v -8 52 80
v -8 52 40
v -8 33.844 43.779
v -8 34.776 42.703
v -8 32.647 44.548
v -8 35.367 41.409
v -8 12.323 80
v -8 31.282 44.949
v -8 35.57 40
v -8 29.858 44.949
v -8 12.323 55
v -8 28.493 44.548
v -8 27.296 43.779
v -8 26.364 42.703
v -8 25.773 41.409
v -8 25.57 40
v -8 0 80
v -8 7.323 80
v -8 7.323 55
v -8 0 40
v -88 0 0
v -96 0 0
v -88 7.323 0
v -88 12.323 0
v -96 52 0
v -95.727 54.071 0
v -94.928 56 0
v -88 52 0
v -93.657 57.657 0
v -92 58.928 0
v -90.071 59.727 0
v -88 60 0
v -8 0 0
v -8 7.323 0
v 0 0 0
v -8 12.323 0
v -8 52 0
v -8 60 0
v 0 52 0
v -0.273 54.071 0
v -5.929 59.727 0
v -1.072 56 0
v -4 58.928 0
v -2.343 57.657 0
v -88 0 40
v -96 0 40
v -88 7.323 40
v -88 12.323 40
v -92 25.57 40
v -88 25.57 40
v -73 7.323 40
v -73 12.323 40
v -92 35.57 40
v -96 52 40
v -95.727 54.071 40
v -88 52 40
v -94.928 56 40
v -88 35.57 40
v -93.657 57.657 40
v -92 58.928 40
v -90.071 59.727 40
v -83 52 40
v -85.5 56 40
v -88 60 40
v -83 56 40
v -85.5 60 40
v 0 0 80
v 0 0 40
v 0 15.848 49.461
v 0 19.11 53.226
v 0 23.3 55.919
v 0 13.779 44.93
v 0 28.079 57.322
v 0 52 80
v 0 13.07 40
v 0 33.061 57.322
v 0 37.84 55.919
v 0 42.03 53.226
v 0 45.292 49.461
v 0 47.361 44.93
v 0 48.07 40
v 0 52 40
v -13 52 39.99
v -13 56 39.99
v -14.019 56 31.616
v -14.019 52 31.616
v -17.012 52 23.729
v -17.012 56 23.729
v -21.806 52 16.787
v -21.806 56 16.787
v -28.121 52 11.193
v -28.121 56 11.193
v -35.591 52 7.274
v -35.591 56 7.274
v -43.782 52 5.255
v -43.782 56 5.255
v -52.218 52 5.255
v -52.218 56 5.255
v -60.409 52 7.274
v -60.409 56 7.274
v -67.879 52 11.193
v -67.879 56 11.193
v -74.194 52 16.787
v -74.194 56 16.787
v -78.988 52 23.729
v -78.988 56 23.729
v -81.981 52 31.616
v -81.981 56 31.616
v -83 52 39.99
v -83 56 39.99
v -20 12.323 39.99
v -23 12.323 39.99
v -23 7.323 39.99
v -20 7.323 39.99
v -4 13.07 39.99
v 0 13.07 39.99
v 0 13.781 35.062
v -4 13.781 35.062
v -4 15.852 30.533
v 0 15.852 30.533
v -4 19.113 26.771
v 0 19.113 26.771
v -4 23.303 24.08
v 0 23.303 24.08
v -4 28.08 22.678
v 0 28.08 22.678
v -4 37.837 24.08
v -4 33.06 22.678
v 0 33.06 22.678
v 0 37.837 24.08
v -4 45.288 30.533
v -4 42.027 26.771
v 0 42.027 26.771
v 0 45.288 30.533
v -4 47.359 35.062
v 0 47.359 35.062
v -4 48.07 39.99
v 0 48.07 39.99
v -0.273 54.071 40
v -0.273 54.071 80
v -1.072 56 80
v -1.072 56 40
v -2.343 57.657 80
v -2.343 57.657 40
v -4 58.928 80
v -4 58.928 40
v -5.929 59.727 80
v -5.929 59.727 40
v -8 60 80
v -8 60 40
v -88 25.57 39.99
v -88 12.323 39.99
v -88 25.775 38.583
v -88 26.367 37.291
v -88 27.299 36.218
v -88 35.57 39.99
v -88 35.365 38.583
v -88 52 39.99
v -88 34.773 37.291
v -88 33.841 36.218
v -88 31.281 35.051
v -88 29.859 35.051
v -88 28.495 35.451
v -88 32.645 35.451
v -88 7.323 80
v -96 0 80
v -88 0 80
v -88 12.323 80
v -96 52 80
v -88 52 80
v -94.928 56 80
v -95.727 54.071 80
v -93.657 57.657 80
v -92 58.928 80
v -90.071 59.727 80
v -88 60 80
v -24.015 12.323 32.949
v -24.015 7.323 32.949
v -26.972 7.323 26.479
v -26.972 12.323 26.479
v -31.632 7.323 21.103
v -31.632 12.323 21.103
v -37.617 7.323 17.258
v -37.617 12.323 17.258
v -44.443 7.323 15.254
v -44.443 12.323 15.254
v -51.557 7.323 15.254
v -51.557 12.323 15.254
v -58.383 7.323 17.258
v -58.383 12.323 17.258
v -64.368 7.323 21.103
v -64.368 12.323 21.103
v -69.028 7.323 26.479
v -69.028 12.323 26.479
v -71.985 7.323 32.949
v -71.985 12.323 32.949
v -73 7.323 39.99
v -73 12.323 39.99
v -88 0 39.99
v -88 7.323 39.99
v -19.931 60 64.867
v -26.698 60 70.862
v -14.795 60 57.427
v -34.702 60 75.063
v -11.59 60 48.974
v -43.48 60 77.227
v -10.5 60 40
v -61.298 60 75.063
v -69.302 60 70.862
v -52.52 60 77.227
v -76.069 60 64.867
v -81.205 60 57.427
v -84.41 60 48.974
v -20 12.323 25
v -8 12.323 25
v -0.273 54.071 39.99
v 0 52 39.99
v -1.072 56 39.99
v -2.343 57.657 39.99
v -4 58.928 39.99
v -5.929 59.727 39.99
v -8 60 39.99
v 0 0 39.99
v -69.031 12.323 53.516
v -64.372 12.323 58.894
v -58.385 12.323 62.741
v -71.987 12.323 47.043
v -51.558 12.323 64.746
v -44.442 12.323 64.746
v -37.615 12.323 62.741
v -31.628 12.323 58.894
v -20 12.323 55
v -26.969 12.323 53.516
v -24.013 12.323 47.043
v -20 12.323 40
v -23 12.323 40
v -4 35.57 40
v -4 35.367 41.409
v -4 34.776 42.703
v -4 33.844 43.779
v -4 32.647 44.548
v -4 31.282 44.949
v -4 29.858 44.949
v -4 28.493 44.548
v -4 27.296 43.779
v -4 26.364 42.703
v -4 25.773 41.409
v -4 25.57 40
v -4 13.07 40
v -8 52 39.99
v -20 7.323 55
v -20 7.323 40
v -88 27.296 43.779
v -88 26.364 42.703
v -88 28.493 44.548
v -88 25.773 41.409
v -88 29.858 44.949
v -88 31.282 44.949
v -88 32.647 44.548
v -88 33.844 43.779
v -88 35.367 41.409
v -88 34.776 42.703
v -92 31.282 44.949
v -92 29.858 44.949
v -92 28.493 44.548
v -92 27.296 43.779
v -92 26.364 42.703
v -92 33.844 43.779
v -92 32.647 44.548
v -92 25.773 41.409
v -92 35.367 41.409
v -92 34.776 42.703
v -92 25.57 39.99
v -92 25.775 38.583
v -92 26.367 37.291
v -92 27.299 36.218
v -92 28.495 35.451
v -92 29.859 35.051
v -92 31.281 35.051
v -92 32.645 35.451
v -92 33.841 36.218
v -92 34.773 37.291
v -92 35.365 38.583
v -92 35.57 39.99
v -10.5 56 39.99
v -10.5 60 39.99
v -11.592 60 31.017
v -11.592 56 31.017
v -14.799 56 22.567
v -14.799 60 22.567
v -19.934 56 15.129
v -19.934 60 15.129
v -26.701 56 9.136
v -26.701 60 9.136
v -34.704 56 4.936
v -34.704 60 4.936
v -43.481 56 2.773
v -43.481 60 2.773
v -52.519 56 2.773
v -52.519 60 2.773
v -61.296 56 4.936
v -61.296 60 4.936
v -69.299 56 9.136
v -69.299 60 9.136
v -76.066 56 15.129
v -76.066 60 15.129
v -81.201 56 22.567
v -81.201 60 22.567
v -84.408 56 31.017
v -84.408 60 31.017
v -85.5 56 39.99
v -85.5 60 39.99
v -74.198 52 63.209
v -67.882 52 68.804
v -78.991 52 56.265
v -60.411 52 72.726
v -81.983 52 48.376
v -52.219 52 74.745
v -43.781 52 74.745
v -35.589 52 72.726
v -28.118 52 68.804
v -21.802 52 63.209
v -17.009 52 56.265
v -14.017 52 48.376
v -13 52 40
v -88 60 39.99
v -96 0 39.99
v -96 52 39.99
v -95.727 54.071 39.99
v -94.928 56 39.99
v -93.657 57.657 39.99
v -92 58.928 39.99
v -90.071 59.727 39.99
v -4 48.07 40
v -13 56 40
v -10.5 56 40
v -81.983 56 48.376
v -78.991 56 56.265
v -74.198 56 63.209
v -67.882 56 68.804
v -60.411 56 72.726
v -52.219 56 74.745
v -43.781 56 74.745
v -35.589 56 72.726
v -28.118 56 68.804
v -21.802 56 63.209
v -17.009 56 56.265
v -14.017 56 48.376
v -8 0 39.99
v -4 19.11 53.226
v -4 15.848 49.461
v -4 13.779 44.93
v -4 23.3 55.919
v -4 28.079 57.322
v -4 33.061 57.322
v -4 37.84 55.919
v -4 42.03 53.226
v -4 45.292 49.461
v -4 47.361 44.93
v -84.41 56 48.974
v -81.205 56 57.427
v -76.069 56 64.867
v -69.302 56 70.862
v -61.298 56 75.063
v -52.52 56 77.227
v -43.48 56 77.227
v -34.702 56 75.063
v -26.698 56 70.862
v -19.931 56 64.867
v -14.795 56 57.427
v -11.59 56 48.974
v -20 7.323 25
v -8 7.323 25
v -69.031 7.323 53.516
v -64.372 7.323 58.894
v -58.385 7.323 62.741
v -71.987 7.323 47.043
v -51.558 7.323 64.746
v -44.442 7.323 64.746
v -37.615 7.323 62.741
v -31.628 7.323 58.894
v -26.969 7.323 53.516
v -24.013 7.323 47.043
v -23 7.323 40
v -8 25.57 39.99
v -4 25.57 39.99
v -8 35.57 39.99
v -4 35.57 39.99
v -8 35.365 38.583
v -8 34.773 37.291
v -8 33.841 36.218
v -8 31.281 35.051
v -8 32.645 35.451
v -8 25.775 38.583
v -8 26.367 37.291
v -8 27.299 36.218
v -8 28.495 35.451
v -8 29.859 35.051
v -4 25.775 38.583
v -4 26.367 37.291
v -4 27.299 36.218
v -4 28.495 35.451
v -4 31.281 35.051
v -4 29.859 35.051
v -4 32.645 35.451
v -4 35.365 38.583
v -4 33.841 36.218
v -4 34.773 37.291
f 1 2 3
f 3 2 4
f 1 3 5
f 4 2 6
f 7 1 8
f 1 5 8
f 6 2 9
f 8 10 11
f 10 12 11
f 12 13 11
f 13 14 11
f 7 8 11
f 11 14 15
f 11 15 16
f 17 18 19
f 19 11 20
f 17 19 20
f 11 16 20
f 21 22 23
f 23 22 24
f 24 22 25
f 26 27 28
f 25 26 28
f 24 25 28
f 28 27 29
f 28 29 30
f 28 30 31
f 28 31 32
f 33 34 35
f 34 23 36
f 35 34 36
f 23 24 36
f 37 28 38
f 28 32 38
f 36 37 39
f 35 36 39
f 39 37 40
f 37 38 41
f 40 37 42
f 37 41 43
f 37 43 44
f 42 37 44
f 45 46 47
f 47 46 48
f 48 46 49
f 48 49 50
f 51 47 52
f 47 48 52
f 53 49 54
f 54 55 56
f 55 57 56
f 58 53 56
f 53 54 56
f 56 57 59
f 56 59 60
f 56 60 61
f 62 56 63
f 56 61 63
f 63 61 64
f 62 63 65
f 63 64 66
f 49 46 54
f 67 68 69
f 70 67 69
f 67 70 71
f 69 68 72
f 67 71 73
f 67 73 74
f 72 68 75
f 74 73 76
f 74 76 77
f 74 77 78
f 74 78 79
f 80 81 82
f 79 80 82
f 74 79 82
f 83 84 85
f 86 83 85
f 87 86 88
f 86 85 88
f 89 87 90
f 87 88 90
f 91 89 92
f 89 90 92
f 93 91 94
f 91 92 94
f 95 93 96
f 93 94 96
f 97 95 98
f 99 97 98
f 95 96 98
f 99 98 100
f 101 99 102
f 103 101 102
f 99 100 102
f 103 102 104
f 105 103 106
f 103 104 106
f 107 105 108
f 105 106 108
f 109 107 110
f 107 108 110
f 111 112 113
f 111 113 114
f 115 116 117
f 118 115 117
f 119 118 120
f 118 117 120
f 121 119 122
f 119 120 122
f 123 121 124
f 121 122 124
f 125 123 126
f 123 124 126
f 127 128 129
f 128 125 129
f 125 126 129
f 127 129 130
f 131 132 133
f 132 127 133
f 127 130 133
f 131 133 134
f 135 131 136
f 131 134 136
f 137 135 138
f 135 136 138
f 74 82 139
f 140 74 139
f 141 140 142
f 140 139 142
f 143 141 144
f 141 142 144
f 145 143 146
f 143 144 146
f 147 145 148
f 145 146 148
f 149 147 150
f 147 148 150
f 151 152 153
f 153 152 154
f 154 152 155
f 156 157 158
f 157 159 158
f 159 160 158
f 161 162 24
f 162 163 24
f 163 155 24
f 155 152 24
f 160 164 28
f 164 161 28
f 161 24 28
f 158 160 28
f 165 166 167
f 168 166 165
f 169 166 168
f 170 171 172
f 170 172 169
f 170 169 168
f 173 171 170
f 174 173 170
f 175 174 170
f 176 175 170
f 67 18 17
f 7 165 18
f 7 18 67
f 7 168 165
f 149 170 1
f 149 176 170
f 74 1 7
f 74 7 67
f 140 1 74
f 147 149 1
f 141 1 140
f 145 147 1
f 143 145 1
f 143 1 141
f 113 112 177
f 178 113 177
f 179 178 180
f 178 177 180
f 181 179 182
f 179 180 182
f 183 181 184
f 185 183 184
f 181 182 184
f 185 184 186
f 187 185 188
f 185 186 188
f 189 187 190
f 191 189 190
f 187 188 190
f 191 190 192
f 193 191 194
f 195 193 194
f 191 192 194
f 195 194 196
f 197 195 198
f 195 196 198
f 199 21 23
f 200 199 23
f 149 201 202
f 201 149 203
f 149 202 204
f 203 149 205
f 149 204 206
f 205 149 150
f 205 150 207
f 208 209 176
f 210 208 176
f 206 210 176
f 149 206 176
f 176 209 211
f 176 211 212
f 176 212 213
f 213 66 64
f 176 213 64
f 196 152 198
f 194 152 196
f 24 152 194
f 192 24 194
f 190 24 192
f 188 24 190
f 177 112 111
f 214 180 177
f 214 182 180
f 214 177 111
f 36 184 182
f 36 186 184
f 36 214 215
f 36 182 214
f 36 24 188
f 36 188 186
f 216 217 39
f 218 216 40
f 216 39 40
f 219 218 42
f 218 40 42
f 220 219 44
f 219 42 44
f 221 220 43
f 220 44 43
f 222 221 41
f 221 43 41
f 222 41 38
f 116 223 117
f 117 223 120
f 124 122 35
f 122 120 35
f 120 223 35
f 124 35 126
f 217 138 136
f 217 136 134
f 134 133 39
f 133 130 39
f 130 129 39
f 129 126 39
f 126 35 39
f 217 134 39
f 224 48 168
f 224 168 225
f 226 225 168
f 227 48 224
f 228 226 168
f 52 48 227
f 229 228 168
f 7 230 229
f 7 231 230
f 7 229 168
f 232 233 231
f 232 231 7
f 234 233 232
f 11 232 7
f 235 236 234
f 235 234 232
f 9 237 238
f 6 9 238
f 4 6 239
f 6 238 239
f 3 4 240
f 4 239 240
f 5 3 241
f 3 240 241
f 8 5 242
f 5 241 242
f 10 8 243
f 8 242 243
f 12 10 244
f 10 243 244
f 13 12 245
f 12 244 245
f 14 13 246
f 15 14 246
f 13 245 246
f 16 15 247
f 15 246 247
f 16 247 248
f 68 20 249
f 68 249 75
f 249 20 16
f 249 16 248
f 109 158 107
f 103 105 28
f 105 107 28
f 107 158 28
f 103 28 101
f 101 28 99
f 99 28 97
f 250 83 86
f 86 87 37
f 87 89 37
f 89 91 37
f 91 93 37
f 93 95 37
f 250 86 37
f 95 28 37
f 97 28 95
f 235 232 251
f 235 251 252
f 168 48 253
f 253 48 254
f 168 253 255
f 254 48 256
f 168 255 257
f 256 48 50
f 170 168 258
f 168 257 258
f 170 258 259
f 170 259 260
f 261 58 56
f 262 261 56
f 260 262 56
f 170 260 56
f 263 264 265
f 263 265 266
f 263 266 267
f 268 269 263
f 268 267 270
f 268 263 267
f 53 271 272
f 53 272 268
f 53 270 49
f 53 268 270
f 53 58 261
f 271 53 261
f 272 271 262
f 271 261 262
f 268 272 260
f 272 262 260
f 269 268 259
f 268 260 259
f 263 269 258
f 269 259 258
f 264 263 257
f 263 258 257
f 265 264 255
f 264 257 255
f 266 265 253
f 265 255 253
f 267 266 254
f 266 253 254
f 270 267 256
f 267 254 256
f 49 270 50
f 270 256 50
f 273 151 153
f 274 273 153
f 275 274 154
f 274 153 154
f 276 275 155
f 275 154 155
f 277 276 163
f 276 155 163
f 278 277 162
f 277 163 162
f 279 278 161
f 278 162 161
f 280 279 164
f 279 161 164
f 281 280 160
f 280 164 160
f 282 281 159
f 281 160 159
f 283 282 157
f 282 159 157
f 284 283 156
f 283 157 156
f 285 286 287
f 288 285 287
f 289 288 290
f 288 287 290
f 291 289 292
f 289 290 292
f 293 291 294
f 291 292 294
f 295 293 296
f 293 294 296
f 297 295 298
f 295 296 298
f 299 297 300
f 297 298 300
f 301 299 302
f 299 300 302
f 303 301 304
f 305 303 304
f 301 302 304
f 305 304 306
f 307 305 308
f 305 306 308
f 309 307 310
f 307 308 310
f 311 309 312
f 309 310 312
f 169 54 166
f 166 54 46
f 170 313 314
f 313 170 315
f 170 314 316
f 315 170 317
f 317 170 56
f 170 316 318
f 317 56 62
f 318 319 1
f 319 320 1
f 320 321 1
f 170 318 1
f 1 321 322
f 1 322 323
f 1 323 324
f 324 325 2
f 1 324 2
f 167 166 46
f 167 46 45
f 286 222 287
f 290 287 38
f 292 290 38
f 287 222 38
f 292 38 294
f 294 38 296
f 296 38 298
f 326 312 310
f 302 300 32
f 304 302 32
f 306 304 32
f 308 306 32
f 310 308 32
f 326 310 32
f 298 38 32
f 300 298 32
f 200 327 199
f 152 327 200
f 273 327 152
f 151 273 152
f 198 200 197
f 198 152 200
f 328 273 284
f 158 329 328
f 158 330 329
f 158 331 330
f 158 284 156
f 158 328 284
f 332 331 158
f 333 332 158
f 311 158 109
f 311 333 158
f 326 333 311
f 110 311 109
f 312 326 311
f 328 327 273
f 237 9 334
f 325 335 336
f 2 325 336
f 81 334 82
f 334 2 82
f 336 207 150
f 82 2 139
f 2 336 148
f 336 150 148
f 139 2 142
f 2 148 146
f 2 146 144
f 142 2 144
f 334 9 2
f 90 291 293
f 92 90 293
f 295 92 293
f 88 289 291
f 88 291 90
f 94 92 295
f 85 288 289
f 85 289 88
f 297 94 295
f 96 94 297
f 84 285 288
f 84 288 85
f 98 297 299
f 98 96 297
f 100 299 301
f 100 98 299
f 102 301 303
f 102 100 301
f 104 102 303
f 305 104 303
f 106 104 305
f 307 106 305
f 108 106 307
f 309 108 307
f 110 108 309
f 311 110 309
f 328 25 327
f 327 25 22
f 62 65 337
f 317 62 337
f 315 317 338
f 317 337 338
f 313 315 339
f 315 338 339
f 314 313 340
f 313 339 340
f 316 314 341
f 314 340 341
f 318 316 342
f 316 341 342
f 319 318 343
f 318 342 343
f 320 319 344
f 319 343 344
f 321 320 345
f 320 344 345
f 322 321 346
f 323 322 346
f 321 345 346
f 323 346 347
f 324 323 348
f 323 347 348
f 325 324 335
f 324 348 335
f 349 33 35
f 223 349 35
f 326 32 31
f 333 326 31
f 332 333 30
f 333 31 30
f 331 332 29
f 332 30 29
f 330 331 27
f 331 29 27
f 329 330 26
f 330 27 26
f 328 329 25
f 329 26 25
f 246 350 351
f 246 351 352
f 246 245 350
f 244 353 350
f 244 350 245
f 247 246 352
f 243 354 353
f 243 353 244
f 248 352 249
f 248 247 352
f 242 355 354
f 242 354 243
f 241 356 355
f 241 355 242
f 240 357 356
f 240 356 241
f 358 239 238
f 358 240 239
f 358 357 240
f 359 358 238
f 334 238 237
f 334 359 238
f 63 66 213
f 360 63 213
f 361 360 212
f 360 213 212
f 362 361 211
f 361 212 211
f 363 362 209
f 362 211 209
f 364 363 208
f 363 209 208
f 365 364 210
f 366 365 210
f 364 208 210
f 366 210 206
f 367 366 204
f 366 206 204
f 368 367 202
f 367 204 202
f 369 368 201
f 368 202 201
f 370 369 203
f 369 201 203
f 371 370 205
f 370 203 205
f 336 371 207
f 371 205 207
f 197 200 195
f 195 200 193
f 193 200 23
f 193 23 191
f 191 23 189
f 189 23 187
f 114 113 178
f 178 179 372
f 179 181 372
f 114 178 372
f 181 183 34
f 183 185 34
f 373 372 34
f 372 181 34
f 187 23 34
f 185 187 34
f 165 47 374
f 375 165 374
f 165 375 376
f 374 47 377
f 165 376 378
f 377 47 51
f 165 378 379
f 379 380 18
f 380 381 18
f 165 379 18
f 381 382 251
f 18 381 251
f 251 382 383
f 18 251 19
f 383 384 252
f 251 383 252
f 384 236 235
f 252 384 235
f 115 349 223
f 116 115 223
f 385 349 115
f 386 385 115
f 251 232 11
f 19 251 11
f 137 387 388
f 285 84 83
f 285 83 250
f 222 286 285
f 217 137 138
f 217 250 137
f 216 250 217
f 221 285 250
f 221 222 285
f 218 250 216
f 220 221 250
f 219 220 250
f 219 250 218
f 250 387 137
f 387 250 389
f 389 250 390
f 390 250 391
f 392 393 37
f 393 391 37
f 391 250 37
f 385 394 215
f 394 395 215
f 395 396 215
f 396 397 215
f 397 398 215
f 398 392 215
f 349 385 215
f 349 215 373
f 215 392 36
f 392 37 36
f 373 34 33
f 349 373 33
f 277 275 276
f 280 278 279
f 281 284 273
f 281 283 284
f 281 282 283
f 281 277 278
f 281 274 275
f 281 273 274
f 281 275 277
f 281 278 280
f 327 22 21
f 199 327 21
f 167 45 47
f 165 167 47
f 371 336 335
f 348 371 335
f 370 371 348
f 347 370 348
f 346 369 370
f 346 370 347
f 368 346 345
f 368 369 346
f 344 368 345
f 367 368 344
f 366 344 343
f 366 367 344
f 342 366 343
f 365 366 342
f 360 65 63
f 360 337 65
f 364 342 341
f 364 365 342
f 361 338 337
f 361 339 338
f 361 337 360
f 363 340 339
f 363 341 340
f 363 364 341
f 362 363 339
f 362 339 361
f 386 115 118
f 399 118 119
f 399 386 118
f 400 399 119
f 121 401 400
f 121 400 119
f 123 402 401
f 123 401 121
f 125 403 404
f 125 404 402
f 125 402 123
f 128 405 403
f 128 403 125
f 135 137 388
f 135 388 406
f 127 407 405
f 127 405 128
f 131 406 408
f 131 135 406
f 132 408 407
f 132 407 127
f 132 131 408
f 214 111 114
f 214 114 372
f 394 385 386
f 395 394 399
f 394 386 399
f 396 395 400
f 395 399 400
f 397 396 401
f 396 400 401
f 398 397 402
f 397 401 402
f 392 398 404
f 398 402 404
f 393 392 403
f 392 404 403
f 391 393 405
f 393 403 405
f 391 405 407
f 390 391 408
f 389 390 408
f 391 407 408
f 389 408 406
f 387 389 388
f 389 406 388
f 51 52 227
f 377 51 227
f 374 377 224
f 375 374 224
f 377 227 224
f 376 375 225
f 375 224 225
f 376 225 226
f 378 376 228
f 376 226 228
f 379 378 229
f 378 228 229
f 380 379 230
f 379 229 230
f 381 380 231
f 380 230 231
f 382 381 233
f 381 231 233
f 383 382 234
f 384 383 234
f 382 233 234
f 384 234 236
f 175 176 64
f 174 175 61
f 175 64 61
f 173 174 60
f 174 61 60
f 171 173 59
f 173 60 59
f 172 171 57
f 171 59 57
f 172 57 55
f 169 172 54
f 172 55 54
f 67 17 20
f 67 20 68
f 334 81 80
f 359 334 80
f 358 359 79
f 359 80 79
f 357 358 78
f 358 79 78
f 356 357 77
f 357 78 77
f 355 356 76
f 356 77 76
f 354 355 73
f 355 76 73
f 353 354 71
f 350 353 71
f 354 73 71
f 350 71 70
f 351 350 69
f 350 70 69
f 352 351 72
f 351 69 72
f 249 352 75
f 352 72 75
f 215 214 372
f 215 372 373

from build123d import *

# Parameters (mm, degrees)
SKETCH2_W           = 80
SKETCH2_H           = 39.677071002
BOSS_EXTRUDE1_DEPTH = 80
SKETCH3_R           = 37.5
CUT_EXTRUDE1_DEPTH  = 4
SKETCH4_R           = 35
CUT_EXTRUDE2_DEPTH  = 4
SKETCH5_R           = 25
CUT_EXTRUDE3_DEPTH  = 134.750151773
SKETCH6_W           = 12
SKETCH6_H           = 30
CUT_EXTRUDE4_DEPTH  = 134.750151773
SKETCH7_R           = 5
CUT_EXTRUDE5_DEPTH  = 92
SKETCH8_R           = 17.5
CUT_EXTRUDE6_DEPTH  = 4
SKETCH9_W           = 153.346772702
SKETCH9_H           = 84.356288718
CUT_EXTRUDE8_DEPTH  = 0.01


with BuildPart() as part:
    # Sketch2 → Boss-Extrude1 (new body)
    with BuildSketch(Plane.XY):
        with BuildLine():
            Line((0, 0), (0, 52))
            ThreePointArc((0, 52), (-2.343145751, 57.656854249), (-8, 60))
            Line((-8, 60), (-88, 60))
            ThreePointArc((-88, 60), (-93.656854249, 57.656854249), (-96, 52))
            Line((-96, 52), (-96, 0))
            Line((-96, 0), (-88, 0))
            Line((-88, 0), (-88, 7.322928998))
            Line((-88, 7.322928998), (-8, 7.322928998))
            Line((-8, 7.322928998), (-8, 0))
            Line((-8, 0), (0, 0))
        make_face()
        with Locations((-48, 32.161464499)):
            Rectangle(SKETCH2_W, SKETCH2_H, mode=Mode.SUBTRACT)
    extrude(amount=BOSS_EXTRUDE1_DEPTH)

    # Sketch3 → Cut-Extrude1 (cut)
    with BuildSketch(Plane(origin=(0, 60, 0), x_dir=(1, 0, 0), z_dir=(0, 1, 0))):
        with Locations(Location((-48, -40, 0), (0, 0, 180))):
            Circle(SKETCH3_R)
    extrude(amount=-CUT_EXTRUDE1_DEPTH, mode=Mode.SUBTRACT)

    # Sketch4 → Cut-Extrude2 (cut)
    with BuildSketch(Plane(origin=(0, 56, 0), x_dir=(1, 0, 0), z_dir=(0, 1, 0))):
        with Locations(Location((-48, -40, 0), (0, 0, 180))):
            Circle(SKETCH4_R)
    extrude(amount=-CUT_EXTRUDE2_DEPTH, mode=Mode.SUBTRACT)

    # Sketch5 → Cut-Extrude3 (cut, through all)
    with BuildSketch(Plane(origin=(0, 12.322928998, 0), x_dir=(1, 0, 0), z_dir=(0, 1, 0))):
        with Locations(Location((-48, -40, 0), (0, 0, 180))):
            Circle(SKETCH5_R)
    extrude(amount=-CUT_EXTRUDE3_DEPTH, mode=Mode.SUBTRACT)

    # Sketch6 → Cut-Extrude4 (cut, through all)
    with BuildSketch(Plane(origin=(0, 12.322928998, 0), x_dir=(1, 0, 0), z_dir=(0, 1, 0))):
        with Locations((-14, -40)):
            Rectangle(SKETCH6_W, SKETCH6_H)
    extrude(amount=-CUT_EXTRUDE4_DEPTH, mode=Mode.SUBTRACT)

    # Sketch7 → Cut-Extrude5 (cut)
    with BuildSketch(Plane(origin=(0, 0, 0), x_dir=(0, 0, -1), z_dir=(1, 0, 0))):
        with Locations((-40, 30.57)):
            Circle(SKETCH7_R)
    extrude(amount=-CUT_EXTRUDE5_DEPTH, mode=Mode.SUBTRACT)

    # Sketch8 → Cut-Extrude6 (cut)
    with BuildSketch(Plane(origin=(0, 0, 0), x_dir=(0, 0, -1), z_dir=(1, 0, 0))):
        with Locations((-40, 30.57)):
            Circle(SKETCH8_R)
    extrude(amount=-CUT_EXTRUDE6_DEPTH, mode=Mode.SUBTRACT)

    # Sketch9 → Cut-Extrude8 (cut)
    with BuildSketch(Plane.XY.offset(40)):
        with Locations((-44.909168978, 22.501506988)):
            Rectangle(SKETCH9_W, SKETCH9_H)
    extrude(amount=-CUT_EXTRUDE8_DEPTH, mode=Mode.SUBTRACT)


with BuildPart() as cut_extrude8_piece_1:
    # of the separate pieces the step leaves, piece 1, a body of its own (cut_extrude8_pieces)
    add(part.part.solids().sort_by_distance((0, 13.07, 40))[0])


with BuildPart() as cut_extrude8_piece_2:
    # of the separate pieces the step leaves, piece 2, a body of its own (cut_extrude8_pieces)
    add(part.part.solids().sort_by_distance((0, 0, 0))[0])


solid = Compound([cut_extrude8_piece_1.part, cut_extrude8_piece_2.part])
